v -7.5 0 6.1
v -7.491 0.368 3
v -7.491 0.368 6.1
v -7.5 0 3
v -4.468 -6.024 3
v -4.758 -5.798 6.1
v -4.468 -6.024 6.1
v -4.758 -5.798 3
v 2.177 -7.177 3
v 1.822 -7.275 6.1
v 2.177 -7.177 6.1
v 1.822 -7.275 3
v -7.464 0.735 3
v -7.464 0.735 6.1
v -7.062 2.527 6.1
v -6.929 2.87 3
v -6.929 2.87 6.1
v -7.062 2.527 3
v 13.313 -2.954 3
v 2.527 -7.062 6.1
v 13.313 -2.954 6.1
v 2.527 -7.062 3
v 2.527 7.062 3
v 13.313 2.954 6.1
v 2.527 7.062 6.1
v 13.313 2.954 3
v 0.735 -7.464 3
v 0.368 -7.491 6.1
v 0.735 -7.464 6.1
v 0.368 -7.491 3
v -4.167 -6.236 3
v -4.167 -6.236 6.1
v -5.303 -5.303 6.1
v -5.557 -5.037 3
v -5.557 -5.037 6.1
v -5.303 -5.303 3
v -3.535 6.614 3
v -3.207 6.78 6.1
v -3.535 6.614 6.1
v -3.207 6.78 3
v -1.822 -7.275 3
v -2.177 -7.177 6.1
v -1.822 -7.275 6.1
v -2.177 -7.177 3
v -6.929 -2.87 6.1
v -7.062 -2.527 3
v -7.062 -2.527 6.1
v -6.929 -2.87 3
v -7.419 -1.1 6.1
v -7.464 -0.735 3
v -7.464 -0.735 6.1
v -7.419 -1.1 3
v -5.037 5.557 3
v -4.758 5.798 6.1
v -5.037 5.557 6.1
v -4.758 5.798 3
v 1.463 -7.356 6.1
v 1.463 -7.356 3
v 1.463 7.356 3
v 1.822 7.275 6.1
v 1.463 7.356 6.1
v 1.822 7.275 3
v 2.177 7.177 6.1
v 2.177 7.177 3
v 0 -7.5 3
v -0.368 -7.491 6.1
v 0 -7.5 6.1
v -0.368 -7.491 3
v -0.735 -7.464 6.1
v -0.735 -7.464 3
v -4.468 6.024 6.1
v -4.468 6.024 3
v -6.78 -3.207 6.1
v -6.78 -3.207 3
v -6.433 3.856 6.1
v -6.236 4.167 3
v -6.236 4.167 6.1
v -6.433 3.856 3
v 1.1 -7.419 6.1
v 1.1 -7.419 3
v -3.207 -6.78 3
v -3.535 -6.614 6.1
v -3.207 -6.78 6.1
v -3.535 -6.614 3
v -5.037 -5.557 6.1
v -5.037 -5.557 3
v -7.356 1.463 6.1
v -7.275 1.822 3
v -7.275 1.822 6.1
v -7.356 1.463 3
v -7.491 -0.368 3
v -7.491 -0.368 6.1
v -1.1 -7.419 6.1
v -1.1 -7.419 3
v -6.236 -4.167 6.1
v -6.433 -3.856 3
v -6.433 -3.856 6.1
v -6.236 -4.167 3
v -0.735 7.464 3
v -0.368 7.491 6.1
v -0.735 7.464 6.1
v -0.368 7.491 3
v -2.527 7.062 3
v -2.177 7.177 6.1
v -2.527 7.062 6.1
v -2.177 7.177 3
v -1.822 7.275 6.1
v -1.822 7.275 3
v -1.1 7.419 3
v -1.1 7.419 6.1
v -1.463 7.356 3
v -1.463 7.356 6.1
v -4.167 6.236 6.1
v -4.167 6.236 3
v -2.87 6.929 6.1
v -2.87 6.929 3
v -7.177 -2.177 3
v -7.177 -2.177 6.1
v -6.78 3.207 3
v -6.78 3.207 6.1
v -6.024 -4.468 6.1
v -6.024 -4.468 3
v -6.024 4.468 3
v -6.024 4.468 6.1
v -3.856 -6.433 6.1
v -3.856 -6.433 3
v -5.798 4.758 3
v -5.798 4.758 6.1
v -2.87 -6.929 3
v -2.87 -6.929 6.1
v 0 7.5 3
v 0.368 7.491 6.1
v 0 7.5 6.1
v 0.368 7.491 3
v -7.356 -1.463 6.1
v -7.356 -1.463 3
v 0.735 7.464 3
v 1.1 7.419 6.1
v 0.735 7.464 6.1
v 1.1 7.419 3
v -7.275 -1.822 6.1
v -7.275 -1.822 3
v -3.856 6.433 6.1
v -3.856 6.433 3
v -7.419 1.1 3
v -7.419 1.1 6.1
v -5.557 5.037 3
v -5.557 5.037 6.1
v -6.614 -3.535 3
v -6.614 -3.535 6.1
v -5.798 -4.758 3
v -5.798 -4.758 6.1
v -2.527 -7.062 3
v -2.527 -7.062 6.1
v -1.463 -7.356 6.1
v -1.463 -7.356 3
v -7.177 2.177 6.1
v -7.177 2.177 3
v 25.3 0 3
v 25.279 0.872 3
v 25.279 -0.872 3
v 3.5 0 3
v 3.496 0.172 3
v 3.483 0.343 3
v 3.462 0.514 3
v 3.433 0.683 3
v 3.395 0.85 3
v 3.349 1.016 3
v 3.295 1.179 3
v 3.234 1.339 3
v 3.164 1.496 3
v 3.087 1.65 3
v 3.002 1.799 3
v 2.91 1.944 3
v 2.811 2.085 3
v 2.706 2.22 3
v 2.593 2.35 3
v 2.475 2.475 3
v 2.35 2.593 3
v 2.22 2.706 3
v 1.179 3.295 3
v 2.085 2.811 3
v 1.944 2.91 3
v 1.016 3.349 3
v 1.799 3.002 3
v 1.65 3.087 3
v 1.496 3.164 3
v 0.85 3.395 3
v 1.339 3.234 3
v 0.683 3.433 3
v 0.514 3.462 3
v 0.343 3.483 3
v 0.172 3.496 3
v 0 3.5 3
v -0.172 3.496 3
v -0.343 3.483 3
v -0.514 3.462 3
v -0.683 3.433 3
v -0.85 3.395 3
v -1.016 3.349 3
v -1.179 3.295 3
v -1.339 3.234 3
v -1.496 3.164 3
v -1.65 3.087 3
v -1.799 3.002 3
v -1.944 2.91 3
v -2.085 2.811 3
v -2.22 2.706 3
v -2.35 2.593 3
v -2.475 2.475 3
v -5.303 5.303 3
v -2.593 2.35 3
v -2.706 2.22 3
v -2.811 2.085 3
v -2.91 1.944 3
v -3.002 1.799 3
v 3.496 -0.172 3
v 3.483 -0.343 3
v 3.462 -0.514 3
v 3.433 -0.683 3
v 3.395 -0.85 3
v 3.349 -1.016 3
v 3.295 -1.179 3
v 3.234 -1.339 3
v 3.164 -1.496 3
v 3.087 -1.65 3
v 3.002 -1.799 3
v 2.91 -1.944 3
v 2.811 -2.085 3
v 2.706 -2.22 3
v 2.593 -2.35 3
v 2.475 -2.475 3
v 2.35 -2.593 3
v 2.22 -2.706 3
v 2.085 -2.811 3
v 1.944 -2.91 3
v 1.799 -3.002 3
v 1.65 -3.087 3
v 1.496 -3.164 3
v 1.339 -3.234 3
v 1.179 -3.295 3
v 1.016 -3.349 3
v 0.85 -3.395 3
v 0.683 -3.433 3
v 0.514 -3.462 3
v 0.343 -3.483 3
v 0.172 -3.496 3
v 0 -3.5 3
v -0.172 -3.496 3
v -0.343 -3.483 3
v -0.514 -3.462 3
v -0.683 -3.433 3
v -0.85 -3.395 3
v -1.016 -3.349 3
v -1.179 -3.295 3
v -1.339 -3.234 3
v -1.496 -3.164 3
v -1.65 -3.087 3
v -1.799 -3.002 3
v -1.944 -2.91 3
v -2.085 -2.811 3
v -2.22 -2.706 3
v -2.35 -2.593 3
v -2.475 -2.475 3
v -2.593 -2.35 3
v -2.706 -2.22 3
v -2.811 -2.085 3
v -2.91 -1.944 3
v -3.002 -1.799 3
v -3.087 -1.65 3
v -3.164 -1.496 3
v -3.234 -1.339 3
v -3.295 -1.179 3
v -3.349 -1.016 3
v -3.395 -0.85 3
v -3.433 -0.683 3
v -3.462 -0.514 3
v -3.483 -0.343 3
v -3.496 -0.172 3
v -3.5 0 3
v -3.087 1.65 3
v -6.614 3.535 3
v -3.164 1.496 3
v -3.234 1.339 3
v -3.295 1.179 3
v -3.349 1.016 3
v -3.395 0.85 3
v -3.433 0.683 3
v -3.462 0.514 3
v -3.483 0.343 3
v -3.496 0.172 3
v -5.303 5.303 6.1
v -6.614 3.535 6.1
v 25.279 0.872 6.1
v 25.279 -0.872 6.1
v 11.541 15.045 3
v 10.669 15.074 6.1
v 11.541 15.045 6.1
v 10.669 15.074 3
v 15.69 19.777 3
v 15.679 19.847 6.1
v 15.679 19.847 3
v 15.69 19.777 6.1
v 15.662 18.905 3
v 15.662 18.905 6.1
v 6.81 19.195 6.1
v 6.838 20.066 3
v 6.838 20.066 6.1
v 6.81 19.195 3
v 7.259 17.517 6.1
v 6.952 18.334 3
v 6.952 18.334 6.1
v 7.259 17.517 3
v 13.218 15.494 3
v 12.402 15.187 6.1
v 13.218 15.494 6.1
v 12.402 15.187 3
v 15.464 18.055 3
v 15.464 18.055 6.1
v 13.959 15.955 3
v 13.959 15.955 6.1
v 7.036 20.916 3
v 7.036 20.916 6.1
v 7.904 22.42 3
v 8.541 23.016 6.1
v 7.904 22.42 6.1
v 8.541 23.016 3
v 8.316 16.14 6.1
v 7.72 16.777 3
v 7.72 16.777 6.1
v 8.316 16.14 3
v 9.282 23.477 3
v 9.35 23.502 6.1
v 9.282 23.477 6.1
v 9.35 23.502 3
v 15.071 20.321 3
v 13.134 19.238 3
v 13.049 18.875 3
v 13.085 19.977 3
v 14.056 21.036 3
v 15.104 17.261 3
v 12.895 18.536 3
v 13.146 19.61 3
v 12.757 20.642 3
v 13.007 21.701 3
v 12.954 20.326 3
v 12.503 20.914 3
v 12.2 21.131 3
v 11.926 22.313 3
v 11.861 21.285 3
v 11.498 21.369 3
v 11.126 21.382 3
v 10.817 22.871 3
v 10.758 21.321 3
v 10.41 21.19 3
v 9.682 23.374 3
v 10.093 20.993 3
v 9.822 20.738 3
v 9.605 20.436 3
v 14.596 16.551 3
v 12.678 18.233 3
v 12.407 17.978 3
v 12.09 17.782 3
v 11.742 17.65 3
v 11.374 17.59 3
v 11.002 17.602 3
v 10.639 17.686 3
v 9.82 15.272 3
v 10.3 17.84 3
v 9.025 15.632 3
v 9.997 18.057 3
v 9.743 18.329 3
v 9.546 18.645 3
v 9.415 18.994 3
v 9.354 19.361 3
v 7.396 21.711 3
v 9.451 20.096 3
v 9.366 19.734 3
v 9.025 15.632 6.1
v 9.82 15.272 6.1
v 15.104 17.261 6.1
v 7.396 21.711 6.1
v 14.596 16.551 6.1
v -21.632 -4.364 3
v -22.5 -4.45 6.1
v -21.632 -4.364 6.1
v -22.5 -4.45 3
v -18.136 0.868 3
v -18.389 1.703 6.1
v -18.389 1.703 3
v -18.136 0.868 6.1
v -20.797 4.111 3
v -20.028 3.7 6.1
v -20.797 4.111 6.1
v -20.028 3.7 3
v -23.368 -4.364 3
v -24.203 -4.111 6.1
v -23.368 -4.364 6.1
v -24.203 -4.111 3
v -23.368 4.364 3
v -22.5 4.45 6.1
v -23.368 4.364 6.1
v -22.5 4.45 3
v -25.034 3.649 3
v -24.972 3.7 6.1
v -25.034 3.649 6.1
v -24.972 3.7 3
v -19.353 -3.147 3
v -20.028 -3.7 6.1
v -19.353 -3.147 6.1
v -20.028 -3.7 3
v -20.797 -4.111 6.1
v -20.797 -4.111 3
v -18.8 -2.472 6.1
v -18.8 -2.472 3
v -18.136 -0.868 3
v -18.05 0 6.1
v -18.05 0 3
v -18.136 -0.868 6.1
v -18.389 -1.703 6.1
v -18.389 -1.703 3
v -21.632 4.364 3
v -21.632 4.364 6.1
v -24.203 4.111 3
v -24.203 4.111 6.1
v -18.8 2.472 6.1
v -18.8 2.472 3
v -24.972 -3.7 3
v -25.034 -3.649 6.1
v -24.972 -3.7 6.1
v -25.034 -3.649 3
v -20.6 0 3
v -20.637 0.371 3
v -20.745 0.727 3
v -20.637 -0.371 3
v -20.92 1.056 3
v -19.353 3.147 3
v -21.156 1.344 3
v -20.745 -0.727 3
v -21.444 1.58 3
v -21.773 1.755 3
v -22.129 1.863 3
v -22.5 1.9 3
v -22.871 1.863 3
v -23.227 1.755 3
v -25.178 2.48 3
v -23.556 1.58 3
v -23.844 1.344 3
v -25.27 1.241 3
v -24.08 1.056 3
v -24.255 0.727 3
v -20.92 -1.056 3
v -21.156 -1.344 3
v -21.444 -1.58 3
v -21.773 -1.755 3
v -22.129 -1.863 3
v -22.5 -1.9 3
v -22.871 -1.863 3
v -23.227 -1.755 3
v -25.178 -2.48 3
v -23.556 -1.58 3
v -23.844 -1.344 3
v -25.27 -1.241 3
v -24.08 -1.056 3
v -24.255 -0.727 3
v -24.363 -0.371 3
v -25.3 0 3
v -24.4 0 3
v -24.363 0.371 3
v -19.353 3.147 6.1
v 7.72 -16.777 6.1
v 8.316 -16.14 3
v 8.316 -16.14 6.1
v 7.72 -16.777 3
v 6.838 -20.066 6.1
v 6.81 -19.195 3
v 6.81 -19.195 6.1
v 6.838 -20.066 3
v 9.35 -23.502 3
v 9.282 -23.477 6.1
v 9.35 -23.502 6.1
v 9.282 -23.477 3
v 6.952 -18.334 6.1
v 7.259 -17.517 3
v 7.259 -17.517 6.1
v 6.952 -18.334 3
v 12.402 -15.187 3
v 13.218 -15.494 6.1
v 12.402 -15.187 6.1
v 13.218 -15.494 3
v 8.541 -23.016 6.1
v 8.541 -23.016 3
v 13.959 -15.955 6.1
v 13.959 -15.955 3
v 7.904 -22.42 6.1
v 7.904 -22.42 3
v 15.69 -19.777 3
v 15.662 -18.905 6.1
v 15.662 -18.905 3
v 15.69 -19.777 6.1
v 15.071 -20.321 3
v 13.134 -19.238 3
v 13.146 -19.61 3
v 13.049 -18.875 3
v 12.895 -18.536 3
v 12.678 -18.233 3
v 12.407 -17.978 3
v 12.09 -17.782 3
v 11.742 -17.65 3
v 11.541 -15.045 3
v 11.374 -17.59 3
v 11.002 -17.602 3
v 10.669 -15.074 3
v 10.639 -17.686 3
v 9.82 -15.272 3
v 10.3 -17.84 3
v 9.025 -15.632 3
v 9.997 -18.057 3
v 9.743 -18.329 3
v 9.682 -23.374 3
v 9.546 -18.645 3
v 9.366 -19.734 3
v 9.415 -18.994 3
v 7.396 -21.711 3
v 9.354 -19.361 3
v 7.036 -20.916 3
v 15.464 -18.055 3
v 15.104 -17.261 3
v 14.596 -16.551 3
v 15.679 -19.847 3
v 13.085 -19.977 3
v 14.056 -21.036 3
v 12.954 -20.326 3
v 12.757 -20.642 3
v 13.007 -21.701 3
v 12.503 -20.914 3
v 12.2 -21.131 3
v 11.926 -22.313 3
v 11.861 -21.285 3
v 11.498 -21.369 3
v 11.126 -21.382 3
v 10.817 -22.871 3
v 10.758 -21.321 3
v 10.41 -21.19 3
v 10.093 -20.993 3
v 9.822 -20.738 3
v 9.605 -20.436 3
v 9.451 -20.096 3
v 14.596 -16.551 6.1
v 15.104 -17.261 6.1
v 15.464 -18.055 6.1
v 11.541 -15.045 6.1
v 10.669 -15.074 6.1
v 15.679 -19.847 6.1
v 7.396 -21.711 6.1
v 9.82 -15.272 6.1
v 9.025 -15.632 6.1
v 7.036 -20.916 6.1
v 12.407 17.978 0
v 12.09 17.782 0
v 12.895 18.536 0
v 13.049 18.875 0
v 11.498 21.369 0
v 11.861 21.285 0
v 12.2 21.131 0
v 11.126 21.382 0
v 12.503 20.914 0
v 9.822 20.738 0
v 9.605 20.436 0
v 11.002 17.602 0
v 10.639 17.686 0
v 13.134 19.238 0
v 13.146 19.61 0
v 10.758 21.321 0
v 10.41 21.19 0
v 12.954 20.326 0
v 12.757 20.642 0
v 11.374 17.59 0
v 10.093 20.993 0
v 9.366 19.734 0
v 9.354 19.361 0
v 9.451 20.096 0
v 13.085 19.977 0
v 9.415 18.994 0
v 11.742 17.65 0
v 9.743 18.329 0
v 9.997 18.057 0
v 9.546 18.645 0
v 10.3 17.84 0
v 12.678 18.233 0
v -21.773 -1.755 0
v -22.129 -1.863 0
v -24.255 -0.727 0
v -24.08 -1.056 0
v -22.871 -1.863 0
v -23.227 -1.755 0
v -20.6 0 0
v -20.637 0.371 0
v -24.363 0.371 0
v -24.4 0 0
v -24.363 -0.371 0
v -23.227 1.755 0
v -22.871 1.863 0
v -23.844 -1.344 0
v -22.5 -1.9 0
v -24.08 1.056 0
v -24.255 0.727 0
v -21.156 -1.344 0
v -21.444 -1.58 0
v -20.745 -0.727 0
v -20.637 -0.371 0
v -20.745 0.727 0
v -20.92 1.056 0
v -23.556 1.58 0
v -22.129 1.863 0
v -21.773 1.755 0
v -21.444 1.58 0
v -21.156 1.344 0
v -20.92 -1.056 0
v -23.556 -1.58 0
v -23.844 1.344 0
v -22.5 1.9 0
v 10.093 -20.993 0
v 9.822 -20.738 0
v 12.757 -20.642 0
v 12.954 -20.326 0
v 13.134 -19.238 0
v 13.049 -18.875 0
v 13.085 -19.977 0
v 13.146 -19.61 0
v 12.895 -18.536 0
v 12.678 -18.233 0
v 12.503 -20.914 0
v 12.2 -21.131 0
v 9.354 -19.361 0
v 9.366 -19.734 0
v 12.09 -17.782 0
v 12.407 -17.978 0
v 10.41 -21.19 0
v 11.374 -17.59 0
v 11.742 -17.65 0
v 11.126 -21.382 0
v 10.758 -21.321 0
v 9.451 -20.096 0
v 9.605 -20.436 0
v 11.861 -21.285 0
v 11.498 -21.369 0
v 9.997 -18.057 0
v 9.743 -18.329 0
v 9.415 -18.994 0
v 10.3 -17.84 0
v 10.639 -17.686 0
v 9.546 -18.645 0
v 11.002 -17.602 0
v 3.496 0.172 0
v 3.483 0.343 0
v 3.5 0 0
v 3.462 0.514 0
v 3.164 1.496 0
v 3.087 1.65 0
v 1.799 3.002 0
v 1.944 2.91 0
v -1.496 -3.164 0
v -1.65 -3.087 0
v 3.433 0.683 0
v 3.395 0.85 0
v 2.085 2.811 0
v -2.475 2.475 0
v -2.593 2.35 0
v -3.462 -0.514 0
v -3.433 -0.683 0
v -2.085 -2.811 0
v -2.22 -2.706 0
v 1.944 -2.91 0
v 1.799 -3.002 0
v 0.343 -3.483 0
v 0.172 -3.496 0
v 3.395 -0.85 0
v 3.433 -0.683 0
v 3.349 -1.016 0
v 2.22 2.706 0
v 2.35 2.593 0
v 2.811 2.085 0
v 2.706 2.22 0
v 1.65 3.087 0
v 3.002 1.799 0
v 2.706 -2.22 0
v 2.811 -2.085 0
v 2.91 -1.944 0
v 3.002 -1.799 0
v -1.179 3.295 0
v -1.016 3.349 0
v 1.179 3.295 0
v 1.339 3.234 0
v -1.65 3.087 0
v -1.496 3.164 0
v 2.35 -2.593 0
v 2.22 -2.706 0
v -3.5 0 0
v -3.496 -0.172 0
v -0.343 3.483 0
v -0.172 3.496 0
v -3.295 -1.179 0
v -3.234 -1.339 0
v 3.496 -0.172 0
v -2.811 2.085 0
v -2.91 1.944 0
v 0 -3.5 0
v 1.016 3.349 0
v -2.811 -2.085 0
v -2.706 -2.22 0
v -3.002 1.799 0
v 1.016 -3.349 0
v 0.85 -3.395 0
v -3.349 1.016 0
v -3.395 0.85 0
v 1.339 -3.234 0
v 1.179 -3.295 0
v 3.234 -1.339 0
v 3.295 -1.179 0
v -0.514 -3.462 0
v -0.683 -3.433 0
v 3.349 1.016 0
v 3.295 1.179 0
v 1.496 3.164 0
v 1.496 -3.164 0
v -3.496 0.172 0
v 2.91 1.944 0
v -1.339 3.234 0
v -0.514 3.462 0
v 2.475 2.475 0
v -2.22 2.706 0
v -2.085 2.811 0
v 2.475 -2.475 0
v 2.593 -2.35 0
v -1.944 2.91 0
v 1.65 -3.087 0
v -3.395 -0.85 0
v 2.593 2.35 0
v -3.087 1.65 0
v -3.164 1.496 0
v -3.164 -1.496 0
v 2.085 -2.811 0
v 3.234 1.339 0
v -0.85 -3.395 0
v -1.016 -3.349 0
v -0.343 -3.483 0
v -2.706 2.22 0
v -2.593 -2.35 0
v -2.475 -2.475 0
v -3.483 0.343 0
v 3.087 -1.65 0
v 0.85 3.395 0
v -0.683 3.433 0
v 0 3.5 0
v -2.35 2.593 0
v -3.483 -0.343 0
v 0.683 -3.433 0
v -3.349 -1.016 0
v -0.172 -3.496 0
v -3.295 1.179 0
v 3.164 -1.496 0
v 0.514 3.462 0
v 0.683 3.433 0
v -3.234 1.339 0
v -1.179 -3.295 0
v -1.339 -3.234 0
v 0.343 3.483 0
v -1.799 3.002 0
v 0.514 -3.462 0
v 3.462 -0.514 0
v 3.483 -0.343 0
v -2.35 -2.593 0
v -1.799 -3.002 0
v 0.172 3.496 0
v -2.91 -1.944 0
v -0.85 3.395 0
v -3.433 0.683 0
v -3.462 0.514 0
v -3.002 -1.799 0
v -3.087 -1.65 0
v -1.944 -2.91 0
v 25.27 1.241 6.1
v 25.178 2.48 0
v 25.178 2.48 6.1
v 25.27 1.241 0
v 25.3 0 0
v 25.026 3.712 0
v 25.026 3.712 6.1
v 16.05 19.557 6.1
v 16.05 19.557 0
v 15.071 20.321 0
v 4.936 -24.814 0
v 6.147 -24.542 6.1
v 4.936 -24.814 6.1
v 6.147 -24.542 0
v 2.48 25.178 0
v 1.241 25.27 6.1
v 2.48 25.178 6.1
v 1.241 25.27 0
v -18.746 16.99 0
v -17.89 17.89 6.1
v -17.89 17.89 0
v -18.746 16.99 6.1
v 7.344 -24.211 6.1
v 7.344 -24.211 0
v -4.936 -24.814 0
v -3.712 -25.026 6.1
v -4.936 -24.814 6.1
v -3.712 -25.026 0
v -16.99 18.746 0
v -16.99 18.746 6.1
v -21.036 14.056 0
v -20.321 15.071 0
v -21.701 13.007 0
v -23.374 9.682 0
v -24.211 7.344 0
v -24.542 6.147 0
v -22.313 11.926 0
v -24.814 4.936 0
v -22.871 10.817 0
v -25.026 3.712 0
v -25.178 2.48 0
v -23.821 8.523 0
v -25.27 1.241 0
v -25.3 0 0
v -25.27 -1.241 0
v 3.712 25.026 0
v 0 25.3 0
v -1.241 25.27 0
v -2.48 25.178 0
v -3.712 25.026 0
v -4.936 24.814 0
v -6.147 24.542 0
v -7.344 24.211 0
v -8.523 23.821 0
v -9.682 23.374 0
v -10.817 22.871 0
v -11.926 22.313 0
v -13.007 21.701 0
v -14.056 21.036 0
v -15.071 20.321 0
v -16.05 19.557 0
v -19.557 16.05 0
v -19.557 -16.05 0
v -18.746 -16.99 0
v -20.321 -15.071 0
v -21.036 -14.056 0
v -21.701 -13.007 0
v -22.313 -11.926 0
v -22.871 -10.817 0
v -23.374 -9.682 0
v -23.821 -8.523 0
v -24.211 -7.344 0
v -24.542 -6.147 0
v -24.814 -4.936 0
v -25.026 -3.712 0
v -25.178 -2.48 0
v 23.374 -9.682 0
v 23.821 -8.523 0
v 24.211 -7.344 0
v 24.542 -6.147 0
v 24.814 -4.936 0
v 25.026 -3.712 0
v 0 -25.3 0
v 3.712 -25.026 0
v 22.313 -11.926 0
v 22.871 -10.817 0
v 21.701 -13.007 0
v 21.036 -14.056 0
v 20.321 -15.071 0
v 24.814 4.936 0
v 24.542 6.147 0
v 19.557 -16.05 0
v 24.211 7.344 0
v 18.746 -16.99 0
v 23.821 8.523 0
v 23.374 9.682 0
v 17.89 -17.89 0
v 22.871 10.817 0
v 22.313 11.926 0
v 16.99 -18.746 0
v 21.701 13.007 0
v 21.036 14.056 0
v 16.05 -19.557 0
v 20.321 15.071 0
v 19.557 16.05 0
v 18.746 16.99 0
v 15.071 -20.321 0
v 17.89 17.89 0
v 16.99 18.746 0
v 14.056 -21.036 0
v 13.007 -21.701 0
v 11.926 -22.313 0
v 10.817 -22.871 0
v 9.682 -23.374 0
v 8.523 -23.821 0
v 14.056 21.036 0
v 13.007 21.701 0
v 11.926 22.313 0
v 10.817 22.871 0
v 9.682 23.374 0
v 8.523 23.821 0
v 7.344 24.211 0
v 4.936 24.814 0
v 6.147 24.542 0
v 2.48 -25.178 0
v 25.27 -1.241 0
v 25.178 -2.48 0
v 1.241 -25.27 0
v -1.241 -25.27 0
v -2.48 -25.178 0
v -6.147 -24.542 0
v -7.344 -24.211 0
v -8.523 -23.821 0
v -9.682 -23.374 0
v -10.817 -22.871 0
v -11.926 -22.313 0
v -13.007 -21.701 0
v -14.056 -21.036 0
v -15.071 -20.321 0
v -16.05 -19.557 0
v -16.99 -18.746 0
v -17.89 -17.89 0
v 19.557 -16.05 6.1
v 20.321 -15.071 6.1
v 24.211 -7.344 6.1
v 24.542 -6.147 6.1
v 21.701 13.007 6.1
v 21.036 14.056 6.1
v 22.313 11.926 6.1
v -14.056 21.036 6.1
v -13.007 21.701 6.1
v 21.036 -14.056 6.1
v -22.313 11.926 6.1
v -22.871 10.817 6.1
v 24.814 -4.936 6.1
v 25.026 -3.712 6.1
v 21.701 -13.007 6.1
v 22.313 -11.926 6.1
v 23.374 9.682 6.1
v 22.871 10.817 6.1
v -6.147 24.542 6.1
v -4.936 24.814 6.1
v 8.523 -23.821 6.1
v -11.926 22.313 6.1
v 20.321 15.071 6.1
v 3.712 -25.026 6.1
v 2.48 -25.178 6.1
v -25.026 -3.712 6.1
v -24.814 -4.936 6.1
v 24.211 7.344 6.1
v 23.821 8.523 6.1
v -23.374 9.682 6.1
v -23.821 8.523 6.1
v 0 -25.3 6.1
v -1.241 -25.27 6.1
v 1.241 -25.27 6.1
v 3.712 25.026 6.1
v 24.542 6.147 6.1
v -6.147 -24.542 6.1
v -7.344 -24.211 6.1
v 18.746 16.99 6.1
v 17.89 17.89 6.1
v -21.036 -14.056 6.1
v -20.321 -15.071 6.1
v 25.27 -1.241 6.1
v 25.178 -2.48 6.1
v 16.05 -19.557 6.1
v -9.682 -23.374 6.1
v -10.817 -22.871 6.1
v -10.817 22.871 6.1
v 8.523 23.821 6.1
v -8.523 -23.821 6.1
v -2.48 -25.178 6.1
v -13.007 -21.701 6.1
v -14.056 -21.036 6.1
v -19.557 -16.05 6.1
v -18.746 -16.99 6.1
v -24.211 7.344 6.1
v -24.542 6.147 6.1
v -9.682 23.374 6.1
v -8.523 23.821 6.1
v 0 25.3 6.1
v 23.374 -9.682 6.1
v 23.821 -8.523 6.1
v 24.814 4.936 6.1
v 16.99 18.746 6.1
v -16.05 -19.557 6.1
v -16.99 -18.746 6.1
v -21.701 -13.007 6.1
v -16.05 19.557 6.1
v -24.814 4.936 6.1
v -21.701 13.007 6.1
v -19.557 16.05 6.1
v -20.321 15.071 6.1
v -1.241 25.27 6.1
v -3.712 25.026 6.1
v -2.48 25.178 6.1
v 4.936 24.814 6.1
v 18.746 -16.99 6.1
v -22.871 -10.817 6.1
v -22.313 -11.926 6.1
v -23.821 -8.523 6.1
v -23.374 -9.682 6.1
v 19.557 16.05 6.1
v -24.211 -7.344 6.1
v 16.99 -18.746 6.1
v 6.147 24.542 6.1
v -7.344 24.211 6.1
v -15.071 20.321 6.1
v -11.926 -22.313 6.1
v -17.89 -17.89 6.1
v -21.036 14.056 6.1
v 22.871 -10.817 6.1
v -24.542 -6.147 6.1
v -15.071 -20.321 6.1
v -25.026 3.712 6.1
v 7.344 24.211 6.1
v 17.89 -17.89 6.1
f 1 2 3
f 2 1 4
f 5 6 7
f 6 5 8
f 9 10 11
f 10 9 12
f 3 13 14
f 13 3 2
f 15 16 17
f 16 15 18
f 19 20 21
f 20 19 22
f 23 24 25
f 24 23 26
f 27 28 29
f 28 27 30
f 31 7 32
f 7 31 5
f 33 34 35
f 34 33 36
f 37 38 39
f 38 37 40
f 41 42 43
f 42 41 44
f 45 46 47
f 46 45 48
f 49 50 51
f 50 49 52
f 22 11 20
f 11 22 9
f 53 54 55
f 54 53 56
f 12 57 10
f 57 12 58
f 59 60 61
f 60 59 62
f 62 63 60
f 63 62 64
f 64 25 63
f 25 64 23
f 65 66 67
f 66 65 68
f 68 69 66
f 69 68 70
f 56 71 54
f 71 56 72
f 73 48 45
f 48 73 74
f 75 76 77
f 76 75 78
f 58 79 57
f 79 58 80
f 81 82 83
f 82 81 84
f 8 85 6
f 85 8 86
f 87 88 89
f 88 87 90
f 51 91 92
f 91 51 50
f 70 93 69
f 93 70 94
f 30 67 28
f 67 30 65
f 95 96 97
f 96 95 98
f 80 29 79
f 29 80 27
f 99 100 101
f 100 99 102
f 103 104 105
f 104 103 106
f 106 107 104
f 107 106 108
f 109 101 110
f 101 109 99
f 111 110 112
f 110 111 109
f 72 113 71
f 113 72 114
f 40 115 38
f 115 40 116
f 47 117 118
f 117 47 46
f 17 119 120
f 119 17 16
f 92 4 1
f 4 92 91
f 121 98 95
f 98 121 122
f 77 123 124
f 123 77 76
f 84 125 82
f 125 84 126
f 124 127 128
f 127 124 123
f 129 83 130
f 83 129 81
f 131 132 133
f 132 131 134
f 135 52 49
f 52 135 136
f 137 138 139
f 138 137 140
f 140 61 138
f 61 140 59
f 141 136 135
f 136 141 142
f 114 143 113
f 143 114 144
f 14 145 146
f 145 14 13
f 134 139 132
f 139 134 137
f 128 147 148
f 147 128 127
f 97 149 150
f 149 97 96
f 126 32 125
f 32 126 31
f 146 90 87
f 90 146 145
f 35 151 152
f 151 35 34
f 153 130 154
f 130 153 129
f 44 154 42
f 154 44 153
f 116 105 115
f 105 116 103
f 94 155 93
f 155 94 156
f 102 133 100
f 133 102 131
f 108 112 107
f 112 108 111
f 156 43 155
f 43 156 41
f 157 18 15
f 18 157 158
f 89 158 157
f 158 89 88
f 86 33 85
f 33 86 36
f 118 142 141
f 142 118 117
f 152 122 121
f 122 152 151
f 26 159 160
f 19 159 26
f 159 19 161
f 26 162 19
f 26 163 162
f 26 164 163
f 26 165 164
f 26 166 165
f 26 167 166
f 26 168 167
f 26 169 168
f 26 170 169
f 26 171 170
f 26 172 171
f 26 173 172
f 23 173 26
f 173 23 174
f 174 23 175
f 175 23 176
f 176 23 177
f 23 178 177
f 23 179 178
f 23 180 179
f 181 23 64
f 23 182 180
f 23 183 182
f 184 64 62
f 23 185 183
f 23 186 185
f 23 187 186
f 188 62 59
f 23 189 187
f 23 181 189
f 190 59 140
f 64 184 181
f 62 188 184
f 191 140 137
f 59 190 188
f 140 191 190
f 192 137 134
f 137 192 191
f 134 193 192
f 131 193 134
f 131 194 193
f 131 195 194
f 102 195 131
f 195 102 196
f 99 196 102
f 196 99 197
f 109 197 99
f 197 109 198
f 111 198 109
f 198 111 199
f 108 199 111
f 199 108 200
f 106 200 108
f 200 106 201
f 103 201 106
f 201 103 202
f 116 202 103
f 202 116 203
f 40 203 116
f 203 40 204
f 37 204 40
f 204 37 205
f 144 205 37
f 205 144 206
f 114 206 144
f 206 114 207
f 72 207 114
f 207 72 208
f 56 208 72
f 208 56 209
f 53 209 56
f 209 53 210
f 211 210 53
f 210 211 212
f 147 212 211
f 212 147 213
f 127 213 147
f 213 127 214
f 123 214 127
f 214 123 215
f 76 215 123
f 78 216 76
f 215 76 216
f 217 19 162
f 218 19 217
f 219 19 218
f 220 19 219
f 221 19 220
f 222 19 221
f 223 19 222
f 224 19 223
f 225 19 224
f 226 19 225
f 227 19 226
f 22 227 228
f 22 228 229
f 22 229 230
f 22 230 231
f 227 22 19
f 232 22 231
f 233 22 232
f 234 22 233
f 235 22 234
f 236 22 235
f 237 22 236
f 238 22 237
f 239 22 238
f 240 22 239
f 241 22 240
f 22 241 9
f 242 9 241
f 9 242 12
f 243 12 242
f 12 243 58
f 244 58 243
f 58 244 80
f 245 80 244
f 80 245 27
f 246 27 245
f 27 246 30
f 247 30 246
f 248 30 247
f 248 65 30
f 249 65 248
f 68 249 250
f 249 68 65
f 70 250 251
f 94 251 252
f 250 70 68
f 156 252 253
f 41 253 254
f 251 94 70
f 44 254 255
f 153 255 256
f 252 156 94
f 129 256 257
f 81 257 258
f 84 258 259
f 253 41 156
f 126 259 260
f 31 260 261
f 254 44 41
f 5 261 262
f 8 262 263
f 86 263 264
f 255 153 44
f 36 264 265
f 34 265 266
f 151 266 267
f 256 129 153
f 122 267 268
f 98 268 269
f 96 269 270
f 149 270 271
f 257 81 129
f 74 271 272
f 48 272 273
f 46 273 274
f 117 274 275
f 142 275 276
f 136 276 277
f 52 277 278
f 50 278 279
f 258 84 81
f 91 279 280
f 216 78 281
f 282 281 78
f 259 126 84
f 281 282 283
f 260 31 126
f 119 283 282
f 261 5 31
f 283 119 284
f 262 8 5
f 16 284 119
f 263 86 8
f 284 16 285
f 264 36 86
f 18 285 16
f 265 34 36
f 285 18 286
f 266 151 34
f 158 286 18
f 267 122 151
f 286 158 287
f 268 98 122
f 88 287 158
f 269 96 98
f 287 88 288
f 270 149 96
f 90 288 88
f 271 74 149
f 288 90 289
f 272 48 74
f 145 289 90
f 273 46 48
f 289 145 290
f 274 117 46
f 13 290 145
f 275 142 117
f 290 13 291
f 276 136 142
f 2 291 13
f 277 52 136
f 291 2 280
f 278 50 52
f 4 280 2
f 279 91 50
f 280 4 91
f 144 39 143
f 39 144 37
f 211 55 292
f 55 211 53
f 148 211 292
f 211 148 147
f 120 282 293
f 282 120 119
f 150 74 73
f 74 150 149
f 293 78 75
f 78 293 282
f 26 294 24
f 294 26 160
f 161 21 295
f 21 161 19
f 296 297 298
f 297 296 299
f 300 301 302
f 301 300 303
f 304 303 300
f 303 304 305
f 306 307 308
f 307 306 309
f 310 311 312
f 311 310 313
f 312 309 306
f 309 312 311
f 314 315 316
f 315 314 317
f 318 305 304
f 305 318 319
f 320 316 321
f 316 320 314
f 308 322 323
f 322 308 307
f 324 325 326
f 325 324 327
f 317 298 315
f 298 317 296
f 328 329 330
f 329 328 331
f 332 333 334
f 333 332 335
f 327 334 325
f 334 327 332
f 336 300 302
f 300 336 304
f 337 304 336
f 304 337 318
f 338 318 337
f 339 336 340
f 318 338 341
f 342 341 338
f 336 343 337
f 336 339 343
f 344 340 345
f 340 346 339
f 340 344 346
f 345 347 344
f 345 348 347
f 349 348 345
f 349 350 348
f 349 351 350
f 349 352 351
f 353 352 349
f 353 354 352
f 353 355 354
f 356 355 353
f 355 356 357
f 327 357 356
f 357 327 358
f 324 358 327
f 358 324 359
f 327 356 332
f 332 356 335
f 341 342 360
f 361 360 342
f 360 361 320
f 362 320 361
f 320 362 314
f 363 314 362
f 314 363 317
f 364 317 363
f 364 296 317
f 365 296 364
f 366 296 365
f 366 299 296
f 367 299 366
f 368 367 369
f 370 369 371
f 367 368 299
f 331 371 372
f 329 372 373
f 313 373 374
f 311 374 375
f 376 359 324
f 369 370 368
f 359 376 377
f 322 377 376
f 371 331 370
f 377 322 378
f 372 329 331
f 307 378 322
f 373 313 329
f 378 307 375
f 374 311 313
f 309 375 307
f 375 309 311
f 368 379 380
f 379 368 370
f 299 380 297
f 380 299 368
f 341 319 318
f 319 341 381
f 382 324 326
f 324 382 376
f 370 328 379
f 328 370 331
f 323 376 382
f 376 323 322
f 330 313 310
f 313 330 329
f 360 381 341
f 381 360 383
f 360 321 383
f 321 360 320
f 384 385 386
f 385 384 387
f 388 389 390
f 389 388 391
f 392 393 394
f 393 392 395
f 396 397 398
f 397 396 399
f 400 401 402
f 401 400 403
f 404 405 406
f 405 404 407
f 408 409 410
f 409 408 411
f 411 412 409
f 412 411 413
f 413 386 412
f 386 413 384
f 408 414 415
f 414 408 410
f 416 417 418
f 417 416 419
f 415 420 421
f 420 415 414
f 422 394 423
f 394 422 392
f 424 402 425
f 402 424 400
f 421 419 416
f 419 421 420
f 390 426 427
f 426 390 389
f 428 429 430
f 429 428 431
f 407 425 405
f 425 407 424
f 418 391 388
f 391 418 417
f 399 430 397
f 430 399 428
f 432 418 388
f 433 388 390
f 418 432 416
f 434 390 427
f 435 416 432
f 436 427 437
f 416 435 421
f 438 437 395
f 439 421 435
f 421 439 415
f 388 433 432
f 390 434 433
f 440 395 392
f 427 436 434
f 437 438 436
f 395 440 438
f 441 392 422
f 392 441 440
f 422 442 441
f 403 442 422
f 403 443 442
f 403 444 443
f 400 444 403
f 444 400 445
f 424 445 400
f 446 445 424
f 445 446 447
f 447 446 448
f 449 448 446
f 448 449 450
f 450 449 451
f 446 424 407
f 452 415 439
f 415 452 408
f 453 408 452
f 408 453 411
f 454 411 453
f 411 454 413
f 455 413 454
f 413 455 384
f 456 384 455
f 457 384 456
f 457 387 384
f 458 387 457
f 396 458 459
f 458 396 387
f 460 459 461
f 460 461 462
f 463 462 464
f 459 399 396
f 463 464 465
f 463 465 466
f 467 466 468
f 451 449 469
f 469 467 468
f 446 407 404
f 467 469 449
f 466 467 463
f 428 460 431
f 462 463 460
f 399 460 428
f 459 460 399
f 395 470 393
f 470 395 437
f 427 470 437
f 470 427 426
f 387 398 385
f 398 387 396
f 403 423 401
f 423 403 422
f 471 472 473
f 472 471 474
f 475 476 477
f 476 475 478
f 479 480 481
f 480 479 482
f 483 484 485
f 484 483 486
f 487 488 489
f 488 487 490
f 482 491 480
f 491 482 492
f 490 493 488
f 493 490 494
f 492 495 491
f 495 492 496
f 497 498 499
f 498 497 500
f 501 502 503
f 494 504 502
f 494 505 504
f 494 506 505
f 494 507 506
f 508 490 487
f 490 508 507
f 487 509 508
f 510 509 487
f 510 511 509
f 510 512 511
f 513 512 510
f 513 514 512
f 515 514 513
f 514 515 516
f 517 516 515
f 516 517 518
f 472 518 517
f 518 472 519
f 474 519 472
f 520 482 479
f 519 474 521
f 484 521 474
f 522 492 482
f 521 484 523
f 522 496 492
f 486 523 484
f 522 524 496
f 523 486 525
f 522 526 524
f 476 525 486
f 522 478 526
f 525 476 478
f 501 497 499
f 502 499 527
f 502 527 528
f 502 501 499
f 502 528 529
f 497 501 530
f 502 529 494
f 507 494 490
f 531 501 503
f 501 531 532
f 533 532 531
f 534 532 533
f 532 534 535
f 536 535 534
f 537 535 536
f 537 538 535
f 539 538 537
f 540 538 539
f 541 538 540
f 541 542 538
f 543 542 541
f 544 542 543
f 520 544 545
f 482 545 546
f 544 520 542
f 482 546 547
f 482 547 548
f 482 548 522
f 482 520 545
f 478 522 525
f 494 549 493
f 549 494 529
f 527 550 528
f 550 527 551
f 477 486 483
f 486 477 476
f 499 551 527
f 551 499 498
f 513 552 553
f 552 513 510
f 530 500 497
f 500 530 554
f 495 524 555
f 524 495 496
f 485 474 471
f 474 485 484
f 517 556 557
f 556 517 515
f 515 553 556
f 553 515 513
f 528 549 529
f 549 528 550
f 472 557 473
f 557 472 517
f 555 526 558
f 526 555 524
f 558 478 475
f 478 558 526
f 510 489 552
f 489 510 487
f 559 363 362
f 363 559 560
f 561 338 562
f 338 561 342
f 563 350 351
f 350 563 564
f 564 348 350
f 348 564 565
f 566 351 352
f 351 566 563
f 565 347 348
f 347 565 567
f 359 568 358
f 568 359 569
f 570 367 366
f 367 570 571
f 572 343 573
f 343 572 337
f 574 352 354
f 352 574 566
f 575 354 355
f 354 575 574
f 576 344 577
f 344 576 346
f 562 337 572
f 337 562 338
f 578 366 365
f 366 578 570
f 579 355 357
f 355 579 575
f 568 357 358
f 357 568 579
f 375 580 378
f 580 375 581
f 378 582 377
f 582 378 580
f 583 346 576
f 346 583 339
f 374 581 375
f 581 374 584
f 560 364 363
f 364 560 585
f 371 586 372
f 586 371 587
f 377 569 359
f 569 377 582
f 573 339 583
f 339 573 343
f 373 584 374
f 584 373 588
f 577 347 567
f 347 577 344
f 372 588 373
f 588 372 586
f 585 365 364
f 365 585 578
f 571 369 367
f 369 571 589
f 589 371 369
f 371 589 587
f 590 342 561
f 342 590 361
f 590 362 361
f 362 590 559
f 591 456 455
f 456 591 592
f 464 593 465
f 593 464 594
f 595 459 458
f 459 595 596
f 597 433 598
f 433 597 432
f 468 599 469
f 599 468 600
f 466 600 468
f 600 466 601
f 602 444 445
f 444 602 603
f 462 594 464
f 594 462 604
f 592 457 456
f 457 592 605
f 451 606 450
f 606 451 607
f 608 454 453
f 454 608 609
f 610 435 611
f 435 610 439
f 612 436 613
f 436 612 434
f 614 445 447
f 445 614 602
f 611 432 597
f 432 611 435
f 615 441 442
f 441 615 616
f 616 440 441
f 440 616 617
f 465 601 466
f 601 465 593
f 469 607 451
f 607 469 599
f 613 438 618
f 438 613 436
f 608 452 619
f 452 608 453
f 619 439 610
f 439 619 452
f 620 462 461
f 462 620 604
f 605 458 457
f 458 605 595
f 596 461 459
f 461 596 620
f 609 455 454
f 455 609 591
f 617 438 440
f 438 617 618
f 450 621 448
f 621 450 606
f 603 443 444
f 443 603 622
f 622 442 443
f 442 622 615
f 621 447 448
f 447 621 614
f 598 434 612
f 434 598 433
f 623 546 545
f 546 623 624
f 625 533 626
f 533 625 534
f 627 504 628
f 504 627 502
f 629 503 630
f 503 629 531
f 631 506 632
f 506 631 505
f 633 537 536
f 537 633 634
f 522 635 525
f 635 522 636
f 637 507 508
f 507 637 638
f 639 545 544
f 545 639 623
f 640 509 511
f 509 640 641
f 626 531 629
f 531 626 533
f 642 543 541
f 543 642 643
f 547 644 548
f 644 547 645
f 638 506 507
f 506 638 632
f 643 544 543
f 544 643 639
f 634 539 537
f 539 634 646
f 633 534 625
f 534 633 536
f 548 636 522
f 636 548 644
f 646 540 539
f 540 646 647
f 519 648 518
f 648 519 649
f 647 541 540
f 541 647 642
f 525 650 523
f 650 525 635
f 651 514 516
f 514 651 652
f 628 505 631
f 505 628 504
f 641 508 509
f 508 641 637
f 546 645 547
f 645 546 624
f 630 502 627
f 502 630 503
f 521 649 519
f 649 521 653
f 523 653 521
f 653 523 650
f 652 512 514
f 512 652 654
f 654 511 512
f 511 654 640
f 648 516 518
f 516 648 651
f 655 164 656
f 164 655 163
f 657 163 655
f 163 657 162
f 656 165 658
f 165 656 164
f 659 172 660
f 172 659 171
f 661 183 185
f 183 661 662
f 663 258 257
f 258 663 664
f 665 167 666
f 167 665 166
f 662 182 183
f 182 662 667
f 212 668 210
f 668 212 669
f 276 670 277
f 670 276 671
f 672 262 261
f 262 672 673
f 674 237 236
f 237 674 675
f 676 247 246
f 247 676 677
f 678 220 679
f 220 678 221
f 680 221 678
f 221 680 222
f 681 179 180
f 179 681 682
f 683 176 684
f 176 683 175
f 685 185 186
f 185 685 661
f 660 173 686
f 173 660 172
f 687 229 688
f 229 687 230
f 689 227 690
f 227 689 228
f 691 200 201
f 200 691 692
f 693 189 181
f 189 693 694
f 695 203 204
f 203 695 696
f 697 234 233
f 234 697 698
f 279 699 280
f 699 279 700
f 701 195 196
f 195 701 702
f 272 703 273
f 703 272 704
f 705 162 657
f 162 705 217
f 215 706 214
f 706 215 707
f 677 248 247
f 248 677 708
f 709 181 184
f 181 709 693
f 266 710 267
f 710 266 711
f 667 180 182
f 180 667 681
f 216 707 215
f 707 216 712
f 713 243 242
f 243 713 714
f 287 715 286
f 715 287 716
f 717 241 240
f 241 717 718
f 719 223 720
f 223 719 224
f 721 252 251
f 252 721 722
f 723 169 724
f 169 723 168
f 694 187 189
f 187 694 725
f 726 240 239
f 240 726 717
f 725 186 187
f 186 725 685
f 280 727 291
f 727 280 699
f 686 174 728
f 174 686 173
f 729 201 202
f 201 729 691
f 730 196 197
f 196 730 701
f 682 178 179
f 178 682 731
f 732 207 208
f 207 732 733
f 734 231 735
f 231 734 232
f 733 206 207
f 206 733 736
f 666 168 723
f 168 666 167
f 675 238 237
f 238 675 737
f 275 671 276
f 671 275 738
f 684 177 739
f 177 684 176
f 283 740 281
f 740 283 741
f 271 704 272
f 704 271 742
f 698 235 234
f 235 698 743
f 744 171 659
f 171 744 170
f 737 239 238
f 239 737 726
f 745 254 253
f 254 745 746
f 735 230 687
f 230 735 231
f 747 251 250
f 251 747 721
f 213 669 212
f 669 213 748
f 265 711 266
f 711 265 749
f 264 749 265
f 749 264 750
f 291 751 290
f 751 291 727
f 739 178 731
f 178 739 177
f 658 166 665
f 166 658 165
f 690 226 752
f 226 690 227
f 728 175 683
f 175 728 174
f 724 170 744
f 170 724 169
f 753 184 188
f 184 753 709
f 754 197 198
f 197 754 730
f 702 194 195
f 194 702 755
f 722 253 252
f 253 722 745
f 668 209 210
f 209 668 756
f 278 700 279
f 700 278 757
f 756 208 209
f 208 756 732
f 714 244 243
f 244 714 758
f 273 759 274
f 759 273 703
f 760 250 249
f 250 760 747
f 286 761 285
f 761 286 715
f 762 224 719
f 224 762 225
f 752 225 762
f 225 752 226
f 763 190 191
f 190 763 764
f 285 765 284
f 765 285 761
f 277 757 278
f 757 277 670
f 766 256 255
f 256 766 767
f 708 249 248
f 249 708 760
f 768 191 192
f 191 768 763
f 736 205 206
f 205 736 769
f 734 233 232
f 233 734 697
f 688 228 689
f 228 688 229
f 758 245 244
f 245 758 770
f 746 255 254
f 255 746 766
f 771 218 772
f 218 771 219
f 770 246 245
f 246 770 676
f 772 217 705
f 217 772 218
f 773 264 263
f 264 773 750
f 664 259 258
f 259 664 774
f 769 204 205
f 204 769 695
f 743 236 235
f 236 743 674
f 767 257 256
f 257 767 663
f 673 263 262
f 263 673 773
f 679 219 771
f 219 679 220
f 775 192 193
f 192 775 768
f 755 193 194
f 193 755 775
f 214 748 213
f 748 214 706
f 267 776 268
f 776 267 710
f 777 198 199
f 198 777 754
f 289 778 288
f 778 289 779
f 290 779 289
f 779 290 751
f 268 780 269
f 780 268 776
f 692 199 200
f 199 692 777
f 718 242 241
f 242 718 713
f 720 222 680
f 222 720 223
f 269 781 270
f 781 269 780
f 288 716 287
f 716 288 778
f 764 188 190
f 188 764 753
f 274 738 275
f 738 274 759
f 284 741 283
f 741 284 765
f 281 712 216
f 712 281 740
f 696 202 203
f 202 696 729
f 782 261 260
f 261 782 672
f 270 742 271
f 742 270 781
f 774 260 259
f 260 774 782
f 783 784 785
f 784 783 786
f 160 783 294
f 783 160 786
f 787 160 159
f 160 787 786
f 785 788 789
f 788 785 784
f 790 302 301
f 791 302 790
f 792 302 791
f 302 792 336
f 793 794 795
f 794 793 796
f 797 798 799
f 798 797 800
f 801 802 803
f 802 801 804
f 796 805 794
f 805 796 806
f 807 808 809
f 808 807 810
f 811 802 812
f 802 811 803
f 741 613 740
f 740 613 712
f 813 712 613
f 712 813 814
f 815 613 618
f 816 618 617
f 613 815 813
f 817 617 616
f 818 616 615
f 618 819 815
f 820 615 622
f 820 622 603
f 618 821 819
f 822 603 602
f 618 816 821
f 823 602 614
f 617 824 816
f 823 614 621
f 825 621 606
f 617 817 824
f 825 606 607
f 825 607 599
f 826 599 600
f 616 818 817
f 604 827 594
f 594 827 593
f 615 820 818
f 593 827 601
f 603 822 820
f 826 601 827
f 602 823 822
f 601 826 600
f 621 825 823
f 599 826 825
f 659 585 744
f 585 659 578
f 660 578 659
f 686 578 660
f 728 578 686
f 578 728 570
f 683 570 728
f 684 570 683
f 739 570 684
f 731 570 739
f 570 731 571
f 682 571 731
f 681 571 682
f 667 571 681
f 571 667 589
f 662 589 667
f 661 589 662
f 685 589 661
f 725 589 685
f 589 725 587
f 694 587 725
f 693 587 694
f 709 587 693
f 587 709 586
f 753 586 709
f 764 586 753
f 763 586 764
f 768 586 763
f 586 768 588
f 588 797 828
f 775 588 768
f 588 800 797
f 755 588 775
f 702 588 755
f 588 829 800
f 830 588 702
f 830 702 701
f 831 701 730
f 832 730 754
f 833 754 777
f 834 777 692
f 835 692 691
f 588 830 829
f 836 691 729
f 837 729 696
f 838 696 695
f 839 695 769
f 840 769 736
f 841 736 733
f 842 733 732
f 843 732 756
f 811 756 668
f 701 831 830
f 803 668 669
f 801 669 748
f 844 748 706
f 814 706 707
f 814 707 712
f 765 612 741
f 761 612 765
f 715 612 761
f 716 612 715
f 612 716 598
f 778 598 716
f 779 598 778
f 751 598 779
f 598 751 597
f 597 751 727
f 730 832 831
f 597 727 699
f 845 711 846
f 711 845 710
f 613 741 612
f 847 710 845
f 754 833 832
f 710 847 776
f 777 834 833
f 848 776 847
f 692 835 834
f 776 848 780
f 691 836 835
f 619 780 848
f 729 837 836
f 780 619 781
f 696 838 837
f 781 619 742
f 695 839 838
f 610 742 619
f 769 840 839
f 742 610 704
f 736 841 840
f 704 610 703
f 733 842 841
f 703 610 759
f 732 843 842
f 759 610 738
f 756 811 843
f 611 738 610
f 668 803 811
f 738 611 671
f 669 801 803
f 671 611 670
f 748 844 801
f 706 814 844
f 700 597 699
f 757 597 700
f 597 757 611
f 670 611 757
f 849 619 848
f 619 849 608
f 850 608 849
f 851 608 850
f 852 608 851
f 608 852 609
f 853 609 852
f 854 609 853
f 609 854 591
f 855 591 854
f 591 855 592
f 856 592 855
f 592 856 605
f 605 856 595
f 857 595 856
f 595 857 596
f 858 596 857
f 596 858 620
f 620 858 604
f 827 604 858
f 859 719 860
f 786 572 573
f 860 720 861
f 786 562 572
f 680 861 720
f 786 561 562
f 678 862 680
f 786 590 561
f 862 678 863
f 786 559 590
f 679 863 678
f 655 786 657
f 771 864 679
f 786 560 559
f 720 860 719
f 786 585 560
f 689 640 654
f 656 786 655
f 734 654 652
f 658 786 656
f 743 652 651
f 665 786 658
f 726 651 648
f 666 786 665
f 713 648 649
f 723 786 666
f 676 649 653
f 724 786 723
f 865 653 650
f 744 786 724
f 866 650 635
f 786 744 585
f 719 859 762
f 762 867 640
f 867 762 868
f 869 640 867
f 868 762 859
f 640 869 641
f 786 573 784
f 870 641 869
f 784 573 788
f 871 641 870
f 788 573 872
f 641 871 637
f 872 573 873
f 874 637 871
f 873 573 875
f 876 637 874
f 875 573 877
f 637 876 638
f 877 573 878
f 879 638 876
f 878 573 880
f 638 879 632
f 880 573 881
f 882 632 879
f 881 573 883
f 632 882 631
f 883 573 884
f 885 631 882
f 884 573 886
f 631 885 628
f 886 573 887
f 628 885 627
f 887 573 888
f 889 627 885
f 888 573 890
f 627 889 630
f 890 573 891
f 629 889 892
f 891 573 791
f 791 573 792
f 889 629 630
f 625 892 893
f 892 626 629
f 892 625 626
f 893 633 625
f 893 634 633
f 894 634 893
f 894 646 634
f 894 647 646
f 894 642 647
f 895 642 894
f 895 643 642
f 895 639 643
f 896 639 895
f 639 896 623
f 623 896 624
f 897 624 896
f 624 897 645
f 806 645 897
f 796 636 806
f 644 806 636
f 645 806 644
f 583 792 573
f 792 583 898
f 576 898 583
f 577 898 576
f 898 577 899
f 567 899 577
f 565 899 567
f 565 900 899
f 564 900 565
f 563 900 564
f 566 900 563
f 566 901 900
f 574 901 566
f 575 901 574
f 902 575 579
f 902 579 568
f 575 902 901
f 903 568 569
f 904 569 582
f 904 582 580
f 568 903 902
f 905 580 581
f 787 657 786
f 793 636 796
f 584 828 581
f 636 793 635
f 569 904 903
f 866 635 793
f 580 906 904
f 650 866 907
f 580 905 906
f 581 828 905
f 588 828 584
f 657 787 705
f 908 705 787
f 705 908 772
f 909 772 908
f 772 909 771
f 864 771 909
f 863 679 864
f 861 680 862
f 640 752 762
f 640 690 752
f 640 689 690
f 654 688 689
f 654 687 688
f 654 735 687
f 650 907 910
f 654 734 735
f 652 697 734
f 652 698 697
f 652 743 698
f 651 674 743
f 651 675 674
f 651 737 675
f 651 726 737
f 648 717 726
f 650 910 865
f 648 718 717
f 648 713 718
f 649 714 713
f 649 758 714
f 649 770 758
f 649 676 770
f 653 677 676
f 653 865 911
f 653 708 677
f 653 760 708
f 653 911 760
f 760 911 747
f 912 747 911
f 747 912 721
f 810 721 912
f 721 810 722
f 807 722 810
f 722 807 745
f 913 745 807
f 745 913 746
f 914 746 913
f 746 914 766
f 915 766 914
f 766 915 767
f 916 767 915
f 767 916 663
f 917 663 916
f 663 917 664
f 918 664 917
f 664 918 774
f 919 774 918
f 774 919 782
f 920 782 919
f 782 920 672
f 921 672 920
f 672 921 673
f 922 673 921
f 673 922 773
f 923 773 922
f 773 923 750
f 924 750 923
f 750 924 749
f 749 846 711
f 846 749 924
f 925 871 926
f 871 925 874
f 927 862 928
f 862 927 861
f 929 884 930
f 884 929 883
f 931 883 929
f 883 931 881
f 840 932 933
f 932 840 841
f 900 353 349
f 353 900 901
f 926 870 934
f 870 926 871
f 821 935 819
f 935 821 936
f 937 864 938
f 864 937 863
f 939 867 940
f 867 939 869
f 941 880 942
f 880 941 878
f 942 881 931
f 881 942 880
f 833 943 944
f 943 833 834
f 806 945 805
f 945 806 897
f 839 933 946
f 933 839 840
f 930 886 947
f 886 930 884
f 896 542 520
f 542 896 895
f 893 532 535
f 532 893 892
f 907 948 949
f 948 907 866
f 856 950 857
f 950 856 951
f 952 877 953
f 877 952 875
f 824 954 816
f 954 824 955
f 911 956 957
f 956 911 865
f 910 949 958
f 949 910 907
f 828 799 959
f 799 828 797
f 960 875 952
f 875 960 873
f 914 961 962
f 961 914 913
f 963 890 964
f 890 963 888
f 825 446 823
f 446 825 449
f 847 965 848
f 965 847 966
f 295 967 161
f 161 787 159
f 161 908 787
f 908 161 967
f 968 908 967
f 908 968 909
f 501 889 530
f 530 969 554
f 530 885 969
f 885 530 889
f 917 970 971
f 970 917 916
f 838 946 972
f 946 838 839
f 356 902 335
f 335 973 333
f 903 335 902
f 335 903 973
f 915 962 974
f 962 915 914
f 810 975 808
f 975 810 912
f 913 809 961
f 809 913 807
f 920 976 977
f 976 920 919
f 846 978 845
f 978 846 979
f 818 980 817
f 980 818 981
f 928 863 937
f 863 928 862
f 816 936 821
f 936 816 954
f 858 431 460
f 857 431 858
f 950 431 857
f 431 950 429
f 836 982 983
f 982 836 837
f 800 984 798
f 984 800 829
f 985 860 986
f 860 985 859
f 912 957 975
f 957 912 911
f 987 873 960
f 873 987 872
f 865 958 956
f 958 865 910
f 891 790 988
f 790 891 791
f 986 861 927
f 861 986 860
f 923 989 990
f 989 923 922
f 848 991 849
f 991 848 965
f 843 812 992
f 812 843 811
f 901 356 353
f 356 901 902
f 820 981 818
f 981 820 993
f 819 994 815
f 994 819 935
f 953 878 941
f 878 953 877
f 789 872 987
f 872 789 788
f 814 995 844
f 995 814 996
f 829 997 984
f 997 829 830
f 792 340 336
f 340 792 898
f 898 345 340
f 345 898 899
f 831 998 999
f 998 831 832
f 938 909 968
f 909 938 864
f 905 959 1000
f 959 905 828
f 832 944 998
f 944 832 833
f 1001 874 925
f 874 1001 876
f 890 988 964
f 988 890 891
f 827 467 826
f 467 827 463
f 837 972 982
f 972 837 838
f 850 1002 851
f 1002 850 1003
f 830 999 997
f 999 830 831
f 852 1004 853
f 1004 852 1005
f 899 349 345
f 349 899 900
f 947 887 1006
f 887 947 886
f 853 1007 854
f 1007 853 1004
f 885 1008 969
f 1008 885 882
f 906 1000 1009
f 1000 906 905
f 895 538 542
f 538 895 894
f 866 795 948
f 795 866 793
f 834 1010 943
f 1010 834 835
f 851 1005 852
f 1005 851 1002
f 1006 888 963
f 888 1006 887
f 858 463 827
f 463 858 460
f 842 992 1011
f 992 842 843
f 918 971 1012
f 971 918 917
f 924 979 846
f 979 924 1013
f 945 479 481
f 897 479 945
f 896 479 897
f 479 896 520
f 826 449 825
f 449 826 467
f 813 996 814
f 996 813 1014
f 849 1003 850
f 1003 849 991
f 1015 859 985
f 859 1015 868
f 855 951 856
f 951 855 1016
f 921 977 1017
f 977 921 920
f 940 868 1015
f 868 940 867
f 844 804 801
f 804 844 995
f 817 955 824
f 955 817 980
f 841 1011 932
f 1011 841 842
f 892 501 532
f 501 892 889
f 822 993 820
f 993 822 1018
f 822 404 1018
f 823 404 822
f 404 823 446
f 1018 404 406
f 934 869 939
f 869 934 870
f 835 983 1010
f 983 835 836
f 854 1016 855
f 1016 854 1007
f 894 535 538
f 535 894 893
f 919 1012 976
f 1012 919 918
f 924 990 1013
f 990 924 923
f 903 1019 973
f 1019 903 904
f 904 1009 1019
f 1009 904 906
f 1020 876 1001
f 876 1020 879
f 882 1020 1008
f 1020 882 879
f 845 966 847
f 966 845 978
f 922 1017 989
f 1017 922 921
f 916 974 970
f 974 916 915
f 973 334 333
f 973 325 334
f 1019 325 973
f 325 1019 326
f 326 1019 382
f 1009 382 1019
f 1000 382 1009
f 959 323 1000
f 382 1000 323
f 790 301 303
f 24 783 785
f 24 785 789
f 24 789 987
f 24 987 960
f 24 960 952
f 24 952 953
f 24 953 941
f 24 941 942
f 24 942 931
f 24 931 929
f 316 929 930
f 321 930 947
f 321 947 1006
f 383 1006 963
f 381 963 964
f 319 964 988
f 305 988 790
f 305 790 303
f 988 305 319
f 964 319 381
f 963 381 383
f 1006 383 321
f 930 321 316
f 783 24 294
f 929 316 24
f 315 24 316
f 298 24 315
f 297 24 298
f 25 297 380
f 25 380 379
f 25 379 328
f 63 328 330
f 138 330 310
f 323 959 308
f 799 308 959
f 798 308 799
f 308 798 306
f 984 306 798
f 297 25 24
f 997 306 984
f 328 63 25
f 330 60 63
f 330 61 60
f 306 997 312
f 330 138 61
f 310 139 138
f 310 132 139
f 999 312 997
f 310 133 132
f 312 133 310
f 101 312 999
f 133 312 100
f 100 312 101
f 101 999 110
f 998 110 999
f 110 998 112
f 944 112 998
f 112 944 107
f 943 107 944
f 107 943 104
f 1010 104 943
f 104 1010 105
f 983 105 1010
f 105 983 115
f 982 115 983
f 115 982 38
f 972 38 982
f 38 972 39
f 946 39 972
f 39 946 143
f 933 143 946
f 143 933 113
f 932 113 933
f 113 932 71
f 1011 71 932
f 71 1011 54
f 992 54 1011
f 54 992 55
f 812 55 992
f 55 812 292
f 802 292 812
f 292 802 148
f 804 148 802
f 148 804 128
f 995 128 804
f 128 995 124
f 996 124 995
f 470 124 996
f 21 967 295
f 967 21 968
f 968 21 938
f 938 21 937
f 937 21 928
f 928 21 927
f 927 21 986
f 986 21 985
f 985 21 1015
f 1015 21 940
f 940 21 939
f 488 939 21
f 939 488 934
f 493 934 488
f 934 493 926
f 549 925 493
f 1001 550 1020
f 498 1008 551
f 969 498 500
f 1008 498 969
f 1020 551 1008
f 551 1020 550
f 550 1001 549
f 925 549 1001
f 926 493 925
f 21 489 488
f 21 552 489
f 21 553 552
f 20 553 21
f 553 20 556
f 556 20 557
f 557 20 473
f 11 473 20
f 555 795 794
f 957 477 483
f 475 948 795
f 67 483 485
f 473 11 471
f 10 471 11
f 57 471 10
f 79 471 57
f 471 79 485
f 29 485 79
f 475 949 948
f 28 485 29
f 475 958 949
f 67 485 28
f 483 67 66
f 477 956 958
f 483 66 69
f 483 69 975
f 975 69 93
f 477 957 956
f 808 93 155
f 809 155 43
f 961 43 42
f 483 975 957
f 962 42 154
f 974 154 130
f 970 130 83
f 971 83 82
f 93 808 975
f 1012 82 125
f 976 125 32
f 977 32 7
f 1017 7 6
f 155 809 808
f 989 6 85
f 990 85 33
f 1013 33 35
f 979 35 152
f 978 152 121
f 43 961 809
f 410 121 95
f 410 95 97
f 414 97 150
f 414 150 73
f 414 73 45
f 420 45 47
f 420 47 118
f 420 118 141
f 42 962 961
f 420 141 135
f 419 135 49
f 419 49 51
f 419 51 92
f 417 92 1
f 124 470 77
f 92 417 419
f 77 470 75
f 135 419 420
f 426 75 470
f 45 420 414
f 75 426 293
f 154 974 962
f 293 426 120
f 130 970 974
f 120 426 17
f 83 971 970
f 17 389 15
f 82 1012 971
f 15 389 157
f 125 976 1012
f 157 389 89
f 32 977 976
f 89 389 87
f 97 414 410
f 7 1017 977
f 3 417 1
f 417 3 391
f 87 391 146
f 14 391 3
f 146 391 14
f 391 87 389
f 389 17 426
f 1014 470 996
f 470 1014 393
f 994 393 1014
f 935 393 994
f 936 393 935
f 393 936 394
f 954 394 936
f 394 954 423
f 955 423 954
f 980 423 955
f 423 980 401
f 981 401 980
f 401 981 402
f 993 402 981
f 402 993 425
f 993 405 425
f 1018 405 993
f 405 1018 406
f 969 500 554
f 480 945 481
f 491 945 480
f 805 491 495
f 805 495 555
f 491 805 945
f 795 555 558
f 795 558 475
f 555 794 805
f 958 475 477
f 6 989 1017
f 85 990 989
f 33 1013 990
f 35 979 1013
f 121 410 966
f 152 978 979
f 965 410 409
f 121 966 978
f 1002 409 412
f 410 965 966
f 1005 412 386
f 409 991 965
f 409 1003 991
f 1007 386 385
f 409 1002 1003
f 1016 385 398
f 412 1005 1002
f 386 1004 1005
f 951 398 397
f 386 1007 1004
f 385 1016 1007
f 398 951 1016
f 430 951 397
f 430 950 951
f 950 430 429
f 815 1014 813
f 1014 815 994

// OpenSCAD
$fn=128;
overlap = 0.1;

module solid(){
union() {
    cylinder(h=6.1, d=50.6);
}
}

module remove(){
    union(){
            
        translate([0,0,3]) union(){
            hull(){
                cylinder(d=15, h=6);
                translate([12.5,0,0]) cylinder(d=6.1, h=6);
            }

            hull(){
                translate([12.5,0,0]) cylinder(d=6.1, h=6);
                translate([30,0,0]) cylinder(d=0.1, h=6);
            }
        }
        
        

     for (a =[0:2]) rotate([0,0,60+120*a]) color("red") translate([22.5,0,3]) cylinder(h=10, d=8.9, $fn=32);
    
    for (a =[0:2]) rotate([0,0,60+120*a]) color("red") translate([22.5,0,-overlap])  cylinder(h=10, d=3.8, $fn=32);
    }
    
    translate([0,0,-overlap]) cylinder(d=7, h=10);
}

difference(){
  solid();
  remove();
}
